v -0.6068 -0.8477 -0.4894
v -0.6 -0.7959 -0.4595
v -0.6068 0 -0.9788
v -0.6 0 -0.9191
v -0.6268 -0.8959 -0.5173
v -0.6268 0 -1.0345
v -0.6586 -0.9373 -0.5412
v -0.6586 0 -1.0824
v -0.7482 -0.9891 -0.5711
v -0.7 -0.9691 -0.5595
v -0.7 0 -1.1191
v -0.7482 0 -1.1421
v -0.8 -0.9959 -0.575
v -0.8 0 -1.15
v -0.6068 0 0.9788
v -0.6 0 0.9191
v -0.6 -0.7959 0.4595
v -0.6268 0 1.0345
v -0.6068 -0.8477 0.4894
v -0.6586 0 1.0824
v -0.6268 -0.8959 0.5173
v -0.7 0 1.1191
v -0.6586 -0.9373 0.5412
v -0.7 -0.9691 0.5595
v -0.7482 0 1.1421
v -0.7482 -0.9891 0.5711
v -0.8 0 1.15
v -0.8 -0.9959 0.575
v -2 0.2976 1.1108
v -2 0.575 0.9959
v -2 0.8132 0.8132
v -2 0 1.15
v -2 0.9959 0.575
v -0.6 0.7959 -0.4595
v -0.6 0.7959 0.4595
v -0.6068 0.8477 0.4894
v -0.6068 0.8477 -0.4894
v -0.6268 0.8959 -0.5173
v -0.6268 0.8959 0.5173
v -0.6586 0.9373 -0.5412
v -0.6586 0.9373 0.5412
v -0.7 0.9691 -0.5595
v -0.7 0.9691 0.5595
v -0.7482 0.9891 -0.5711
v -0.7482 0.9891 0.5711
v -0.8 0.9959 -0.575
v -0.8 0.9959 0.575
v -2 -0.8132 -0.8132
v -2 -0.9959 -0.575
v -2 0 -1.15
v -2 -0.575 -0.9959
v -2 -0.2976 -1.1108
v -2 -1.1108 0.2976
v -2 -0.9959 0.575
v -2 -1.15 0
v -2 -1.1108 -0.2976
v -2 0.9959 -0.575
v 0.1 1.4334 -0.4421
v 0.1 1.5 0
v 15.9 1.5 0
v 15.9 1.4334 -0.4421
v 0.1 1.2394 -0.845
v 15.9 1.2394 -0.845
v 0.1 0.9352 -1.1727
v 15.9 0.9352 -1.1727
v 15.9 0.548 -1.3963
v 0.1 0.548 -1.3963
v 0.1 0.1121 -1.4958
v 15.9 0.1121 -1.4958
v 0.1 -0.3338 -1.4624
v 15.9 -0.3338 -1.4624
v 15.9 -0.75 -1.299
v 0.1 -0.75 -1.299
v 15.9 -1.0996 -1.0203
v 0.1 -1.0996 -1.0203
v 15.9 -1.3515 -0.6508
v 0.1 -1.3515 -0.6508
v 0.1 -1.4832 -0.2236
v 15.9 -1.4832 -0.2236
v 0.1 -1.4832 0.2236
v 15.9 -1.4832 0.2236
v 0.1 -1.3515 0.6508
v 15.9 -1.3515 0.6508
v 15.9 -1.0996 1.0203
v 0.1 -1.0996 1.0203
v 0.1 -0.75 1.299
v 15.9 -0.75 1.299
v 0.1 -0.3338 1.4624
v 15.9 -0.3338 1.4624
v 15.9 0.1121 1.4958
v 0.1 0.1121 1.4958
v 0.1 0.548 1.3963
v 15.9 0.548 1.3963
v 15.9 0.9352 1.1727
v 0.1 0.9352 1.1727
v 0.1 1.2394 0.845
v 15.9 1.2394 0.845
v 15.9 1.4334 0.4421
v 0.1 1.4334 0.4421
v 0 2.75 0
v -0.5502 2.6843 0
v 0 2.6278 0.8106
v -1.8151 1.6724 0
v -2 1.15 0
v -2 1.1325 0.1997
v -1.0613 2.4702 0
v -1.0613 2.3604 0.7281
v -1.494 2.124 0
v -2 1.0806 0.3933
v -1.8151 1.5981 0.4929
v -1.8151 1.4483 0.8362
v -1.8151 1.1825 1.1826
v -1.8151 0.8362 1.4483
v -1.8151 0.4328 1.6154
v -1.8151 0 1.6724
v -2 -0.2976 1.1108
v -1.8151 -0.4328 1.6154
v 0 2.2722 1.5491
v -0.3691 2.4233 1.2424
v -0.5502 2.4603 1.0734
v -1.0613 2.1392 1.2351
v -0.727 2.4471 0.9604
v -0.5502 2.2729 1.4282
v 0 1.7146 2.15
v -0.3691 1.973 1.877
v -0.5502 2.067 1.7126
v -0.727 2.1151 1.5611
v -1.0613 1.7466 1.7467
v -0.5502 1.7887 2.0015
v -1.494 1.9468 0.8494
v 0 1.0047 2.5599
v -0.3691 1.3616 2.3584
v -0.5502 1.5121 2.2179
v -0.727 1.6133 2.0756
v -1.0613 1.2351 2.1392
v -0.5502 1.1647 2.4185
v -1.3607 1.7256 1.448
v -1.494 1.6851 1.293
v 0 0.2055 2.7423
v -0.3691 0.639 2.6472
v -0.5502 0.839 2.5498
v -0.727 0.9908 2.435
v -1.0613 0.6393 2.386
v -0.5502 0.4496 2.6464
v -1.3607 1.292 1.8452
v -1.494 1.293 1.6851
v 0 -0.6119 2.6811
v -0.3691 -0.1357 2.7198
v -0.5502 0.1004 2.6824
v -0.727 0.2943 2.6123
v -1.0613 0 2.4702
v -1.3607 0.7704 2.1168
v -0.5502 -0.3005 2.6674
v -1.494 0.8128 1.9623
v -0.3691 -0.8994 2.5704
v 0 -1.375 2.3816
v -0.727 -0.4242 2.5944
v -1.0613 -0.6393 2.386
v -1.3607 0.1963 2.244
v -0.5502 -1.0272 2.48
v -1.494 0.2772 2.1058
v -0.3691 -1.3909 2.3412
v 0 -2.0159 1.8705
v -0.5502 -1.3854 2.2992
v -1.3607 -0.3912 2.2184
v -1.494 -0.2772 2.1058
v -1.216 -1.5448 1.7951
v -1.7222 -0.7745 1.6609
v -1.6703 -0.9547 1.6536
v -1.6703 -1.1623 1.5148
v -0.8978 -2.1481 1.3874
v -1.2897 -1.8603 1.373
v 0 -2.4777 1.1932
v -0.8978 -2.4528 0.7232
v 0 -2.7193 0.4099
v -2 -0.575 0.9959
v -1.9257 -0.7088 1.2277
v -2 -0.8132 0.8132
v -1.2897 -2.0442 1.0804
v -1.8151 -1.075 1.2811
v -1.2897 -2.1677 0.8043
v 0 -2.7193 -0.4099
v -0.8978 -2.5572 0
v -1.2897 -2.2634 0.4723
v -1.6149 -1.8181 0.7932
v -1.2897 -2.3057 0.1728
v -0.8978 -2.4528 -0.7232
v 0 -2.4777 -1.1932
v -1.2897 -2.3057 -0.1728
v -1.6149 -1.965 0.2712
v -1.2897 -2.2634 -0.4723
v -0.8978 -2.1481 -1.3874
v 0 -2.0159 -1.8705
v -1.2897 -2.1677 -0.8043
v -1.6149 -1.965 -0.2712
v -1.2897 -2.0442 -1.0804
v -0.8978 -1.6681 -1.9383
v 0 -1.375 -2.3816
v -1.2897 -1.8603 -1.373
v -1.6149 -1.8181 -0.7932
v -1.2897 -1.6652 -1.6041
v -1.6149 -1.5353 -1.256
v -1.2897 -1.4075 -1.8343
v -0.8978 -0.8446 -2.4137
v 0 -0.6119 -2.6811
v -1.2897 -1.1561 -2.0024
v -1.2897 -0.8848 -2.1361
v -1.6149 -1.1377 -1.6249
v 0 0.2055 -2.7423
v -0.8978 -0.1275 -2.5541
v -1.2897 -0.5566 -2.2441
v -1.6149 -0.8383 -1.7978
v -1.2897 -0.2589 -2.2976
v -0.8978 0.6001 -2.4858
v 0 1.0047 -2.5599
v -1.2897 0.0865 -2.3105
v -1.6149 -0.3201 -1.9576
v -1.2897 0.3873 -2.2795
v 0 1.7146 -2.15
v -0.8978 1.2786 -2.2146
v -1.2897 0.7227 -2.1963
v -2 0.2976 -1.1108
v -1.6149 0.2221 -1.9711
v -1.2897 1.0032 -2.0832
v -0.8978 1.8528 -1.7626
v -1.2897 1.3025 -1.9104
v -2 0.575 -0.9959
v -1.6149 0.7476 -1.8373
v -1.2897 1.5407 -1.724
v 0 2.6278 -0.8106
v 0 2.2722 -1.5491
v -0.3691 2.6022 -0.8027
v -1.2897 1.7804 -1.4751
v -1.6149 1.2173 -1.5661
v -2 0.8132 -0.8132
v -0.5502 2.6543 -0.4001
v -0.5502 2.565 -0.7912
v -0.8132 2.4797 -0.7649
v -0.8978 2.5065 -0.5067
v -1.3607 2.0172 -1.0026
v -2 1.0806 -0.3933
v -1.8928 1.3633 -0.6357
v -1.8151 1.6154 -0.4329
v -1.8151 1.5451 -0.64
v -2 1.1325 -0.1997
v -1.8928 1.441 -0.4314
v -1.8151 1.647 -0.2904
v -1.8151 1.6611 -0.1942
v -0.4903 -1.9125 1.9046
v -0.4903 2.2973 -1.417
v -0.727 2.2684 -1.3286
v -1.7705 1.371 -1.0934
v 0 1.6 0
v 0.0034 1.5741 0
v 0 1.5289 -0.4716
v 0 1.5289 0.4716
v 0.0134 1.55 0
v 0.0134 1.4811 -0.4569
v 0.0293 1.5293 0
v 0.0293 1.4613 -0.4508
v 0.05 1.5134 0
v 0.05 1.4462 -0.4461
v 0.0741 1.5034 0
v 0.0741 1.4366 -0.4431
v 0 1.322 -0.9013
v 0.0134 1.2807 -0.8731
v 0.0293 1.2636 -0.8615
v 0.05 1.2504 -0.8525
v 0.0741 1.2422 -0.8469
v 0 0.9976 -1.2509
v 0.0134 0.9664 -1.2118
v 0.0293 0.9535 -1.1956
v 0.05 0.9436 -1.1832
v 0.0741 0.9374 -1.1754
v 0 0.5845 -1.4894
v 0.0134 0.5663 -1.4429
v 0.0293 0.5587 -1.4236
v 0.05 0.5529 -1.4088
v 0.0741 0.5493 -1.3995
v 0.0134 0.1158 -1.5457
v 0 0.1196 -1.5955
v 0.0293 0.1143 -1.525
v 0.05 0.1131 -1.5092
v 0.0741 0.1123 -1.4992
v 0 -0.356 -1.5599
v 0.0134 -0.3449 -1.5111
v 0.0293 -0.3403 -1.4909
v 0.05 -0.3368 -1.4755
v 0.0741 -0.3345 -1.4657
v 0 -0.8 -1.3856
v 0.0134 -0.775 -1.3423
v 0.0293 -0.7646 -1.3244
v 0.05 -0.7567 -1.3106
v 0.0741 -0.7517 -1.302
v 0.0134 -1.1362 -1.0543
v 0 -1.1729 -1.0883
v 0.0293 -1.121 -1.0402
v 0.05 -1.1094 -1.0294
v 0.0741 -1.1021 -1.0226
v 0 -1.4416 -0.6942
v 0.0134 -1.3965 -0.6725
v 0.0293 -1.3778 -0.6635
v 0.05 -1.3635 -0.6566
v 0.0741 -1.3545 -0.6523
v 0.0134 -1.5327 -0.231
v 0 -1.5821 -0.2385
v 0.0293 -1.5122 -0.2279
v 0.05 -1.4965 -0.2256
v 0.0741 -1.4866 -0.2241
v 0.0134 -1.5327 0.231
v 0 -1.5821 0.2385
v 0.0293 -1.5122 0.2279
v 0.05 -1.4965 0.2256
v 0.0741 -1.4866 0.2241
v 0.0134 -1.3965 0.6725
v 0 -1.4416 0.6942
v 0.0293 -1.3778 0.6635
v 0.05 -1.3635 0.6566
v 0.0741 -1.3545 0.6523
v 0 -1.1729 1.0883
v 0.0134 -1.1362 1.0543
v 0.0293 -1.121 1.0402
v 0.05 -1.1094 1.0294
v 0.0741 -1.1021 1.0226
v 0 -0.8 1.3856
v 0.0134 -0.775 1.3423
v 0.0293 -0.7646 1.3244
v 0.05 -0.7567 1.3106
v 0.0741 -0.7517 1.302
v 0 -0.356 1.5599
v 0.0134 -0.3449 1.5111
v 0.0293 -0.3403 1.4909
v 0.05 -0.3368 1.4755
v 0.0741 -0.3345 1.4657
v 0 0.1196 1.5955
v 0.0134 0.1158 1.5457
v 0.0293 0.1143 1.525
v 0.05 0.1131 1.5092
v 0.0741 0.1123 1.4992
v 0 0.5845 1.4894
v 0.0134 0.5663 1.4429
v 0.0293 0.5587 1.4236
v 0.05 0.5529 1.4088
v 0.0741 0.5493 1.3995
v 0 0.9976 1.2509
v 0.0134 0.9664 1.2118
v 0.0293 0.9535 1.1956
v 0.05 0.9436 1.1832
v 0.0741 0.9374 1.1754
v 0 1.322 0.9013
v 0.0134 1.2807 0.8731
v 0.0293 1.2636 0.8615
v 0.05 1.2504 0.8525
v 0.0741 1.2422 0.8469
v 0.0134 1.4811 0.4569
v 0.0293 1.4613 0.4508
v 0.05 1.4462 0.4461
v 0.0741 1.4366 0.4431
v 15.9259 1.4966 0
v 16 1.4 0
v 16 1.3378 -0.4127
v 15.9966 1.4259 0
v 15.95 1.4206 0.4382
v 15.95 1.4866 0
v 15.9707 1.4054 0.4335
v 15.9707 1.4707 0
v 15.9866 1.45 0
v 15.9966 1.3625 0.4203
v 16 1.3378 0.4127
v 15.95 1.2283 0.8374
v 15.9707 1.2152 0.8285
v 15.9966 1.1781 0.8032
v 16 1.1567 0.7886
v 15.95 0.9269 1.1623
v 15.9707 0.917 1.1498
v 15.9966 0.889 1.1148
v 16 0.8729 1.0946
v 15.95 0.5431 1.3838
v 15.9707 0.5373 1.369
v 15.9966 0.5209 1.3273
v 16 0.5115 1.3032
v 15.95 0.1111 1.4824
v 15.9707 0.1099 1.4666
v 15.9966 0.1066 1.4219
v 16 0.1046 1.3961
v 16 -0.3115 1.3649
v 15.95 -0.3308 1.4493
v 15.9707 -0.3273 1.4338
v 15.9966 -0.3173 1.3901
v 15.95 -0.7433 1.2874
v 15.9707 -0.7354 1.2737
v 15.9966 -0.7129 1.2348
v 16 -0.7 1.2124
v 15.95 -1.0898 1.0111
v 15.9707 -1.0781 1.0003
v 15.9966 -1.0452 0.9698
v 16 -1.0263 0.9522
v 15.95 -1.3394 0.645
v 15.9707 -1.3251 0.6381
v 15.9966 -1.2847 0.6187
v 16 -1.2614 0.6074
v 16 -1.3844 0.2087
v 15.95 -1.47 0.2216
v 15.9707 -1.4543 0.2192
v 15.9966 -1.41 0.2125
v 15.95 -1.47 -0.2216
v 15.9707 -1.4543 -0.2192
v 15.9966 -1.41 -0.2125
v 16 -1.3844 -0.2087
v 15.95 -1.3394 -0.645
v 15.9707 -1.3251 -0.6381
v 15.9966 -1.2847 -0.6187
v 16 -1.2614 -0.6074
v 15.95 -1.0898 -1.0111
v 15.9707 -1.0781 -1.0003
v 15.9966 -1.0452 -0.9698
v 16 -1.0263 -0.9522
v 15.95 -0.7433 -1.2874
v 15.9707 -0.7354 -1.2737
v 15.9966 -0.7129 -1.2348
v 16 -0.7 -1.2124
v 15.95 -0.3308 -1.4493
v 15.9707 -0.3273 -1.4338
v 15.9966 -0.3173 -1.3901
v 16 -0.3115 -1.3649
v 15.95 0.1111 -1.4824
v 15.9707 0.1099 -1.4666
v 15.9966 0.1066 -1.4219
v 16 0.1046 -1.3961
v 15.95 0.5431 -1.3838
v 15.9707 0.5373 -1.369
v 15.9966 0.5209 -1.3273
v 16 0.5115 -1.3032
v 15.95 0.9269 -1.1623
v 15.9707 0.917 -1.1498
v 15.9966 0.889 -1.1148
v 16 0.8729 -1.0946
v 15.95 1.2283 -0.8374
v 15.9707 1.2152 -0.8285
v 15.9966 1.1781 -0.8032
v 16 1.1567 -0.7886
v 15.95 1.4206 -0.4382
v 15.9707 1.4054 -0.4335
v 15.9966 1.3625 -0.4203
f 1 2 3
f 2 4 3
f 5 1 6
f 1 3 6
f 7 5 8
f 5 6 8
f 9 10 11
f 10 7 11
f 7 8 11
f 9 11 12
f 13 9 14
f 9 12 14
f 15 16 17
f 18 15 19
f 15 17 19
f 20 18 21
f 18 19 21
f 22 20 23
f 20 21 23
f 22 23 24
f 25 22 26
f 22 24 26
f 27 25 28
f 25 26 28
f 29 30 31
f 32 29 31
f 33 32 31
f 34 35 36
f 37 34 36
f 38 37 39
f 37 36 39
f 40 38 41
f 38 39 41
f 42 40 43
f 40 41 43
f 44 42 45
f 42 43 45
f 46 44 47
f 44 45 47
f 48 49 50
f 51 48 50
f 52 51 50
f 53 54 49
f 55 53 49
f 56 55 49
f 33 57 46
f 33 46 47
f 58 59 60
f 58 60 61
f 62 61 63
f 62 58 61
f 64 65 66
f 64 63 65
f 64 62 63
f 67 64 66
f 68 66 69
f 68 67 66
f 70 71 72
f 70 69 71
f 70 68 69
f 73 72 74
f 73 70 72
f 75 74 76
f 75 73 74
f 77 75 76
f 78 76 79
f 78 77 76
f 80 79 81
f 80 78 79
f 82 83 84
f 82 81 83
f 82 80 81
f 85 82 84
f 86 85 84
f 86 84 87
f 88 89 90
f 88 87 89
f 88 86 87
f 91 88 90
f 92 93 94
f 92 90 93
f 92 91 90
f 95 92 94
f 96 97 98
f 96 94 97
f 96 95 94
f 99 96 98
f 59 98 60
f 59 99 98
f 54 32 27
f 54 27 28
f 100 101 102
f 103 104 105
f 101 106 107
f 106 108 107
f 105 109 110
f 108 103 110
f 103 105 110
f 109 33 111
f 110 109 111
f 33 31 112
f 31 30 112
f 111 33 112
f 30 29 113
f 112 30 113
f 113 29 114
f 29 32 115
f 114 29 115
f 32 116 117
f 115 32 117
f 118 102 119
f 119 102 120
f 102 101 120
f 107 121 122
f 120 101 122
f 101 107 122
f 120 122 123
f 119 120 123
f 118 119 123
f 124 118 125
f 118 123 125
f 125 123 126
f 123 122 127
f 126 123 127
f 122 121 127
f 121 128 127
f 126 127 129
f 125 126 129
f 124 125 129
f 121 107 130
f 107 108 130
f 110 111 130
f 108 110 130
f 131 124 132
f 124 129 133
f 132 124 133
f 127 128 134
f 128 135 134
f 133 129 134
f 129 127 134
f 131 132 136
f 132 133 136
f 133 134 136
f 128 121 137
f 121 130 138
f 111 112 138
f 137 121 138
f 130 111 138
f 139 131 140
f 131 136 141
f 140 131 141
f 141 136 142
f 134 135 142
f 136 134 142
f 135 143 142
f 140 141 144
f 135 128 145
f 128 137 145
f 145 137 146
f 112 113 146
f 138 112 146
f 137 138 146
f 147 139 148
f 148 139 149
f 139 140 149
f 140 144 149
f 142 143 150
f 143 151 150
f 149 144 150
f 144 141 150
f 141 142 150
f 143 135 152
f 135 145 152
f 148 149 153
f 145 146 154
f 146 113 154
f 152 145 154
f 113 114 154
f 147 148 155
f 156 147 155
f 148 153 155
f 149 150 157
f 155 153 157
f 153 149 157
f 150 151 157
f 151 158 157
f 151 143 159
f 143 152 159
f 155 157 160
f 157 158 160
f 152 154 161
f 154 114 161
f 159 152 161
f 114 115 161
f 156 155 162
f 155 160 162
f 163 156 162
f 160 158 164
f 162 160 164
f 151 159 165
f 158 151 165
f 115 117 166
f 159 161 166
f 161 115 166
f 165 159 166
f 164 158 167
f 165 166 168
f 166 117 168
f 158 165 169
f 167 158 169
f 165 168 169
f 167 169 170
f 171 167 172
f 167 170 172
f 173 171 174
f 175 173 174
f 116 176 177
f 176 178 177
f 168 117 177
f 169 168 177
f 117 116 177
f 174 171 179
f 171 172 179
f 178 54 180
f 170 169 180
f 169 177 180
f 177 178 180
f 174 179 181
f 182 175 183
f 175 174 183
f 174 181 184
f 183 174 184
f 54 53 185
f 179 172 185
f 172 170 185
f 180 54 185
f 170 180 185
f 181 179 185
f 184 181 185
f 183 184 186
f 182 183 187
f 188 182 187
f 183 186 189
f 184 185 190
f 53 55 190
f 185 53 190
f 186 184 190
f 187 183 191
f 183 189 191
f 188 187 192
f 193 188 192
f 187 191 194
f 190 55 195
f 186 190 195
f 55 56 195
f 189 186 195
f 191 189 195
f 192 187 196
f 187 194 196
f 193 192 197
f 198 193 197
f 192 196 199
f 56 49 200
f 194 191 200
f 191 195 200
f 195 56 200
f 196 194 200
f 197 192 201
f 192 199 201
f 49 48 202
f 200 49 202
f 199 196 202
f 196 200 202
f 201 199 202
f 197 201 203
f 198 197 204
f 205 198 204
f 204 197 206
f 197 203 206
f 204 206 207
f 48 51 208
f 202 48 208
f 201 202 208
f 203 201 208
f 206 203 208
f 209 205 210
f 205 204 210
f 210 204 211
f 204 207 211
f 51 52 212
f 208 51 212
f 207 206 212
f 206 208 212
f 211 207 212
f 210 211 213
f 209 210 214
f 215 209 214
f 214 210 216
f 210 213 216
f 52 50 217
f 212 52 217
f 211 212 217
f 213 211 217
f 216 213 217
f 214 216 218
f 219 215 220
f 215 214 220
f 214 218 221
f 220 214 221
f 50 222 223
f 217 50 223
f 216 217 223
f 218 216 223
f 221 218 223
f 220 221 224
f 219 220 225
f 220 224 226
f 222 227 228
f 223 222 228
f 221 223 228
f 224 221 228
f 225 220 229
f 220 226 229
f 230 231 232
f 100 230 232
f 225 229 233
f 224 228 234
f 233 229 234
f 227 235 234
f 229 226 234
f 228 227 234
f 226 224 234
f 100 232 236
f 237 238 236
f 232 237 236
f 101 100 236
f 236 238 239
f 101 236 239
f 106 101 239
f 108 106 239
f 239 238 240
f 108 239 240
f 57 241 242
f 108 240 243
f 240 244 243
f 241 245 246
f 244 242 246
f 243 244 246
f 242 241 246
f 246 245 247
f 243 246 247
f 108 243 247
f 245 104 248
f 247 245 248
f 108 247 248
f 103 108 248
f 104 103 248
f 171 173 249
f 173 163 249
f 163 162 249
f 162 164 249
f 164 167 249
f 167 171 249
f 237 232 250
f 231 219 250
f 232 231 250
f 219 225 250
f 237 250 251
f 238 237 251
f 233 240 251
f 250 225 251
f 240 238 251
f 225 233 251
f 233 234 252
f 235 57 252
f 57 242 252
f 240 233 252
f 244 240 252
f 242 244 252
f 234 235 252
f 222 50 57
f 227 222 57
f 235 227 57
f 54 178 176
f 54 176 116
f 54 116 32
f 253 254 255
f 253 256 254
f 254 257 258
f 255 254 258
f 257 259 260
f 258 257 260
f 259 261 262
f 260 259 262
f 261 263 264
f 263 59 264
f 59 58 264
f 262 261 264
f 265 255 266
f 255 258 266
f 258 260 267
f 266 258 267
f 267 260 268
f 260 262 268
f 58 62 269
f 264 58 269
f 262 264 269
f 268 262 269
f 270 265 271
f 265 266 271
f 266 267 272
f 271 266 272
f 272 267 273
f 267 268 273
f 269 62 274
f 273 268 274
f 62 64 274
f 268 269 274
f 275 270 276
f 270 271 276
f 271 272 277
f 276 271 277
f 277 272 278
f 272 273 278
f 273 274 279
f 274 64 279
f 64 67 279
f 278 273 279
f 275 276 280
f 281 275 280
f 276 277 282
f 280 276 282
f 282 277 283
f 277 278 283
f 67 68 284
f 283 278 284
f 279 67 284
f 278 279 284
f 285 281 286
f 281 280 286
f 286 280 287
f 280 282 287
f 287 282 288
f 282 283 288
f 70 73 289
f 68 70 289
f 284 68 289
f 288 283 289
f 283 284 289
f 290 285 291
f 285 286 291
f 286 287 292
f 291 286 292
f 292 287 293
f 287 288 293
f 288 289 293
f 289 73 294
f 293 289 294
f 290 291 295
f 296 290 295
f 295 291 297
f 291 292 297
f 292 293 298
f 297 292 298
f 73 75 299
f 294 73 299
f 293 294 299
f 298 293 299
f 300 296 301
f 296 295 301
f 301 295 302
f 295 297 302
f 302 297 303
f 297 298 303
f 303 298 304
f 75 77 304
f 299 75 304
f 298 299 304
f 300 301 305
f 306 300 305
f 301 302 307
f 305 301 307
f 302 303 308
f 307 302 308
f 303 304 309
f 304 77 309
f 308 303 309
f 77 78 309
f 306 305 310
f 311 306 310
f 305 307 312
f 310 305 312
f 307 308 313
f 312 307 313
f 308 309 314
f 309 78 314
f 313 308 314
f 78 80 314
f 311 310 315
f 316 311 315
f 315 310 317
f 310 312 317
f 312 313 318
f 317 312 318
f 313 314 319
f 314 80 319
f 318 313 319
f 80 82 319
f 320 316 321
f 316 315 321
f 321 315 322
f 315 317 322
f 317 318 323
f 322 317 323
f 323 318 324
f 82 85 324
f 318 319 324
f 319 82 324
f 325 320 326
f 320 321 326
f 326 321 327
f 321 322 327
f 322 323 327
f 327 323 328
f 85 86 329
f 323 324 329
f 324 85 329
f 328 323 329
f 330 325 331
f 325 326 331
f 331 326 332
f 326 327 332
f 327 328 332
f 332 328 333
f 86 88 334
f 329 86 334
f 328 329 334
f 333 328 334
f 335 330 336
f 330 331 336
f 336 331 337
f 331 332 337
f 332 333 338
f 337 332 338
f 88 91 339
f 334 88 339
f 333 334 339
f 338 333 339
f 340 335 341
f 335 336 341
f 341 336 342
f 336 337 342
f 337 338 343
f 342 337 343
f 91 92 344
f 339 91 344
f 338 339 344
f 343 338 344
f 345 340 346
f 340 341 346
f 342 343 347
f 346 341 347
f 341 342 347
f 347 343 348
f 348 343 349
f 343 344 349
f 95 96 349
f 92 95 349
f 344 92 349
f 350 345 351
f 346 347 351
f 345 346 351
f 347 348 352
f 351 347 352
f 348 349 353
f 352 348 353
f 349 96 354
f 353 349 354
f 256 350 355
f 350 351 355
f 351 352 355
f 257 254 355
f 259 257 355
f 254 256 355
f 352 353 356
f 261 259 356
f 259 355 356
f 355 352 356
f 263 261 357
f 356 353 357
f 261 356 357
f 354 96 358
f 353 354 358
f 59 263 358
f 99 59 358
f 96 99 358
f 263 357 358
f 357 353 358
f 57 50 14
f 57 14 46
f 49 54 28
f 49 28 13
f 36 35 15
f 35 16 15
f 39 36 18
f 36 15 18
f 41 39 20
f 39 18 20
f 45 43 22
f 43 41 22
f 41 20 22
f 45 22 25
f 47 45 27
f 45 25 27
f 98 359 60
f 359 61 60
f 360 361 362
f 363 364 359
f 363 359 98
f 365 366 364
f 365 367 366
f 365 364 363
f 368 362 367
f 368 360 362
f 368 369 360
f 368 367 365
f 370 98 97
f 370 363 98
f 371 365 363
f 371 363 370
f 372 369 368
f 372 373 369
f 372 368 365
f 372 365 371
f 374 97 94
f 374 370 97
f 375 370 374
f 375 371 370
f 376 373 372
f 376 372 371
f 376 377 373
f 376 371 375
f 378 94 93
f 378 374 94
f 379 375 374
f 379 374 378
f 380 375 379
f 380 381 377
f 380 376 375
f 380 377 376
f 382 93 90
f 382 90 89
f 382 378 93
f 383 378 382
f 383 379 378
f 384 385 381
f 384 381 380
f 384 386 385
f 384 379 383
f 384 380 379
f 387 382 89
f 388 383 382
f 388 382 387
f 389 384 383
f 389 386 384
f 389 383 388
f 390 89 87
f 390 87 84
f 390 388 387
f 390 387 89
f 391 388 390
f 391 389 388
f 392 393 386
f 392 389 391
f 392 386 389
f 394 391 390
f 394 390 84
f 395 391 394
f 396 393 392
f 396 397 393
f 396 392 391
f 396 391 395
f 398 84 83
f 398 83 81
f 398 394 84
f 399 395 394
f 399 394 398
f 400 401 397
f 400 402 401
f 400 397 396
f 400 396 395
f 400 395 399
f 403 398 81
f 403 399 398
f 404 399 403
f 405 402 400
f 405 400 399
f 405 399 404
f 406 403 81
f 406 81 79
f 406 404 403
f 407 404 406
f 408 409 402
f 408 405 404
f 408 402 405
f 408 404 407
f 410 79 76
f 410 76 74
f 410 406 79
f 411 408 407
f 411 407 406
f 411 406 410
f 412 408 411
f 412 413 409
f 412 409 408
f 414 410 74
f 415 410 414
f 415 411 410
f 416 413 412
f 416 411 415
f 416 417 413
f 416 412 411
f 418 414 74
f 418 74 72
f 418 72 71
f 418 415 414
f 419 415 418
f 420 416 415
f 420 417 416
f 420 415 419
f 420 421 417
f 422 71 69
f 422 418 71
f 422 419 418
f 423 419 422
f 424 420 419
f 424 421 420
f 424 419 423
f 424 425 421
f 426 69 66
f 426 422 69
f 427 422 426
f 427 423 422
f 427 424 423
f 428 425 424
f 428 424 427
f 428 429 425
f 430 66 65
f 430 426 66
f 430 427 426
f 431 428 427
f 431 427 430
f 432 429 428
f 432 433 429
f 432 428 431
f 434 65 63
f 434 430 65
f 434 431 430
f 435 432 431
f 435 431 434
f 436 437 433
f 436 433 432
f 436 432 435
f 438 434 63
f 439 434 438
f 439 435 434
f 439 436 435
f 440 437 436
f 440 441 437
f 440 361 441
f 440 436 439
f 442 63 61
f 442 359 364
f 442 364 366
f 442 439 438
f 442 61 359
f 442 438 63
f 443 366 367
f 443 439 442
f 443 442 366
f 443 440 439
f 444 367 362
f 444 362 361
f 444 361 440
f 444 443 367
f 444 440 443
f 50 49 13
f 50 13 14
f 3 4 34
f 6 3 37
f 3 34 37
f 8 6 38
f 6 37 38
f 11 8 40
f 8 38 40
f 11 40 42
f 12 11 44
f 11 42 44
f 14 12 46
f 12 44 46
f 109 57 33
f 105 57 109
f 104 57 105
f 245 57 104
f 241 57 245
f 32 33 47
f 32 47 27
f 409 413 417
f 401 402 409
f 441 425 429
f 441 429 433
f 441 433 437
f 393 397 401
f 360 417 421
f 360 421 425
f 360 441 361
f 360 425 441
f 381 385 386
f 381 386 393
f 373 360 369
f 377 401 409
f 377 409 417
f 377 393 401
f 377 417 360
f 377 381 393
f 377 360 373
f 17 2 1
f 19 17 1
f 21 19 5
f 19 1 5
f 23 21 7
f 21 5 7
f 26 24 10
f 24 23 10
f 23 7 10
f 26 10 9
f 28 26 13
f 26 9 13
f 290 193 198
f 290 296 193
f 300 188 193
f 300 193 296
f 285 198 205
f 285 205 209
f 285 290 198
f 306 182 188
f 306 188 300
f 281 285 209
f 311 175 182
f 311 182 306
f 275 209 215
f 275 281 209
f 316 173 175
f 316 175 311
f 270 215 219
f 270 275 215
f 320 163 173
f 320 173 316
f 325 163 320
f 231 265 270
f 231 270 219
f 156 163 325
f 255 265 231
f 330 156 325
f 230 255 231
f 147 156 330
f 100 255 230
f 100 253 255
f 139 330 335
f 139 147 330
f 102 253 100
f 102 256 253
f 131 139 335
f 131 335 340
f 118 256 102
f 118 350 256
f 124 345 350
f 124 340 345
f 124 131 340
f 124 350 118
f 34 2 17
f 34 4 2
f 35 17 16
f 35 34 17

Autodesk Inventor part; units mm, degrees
ref_plane "YZ Plane" through (0, 0, 0) normal (1, 0, 0) x (0, 1, 0)
ref_plane "XZ Plane" through (0, 0, 0) normal (0, 1, 0) x (-1, 0, 0)
ref_plane "XY Plane" through (0, 0, 0) normal (0, 0, 1) x (1, 0, 0)
sketch "スケッチ1" plane through (0, 0, 0) normal (0, 0, 1) x (1, 0, 0)
  line L0 (0, 0) -> (16, 0)
  line L1 (16, 0) -> (16, 1.5)
  line L2 (16, 1.5) -> (0, 1.5)
  line L3 (0, 1.5) -> (0, 0)
  line L4 (0, 0) -> (0, 2.75)
  line L5 (0, 0) -> (-2, 0)
  line L6 (-2, 0) -> (0, 0)
  line L7 (-2, 0) -> (-2, 1.15)
  arc A0 (0, 2.75) -> (-2, 1.15) centre (-0.0403, 0.7504) ccw
  dimension "d0" = 1.5
  dimension "d1" = 16
  dimension "d3" = 2
  dimension "d4" = 2.75
  dimension "d5" = 1.15
  dimension "d6" = 2
revolve "回転1" add sketch "スケッチ1" angle 360 about axis through (-2, 0, 0) along (1, 0, 0)
thread "ねじ1" size "M3x0.5" class "6g" standard "ANSI Metric M Profile" length 100
sketch "スケッチ2" plane through (-2, 0, 0) normal (-1, 0, 0) x (0, 0, 1)
  circle A0 centre (0, 0) radius 1.15 projected
  line L0 (-0.575, 0.9959) -> (0.575, 0.9959)
  line L1 (0.575, 0.9959) -> (1.15, 0)
  line L2 (1.15, 0) -> (0.575, -0.9959)
  line L3 (0.575, -0.9959) -> (-0.575, -0.9959)
  line L4 (-0.575, -0.9959) -> (-1.15, 0)
  line L5 (-1.15, 0) -> (-0.575, 0.9959)
  dimension "d10" = 1.15
  dimension "d11" = 1.9919
extrude "押し出し1" cut sketch "スケッチ2" against normal blind 1.4 contours L2 L3 L4 L5 L0 L1
fillet "フィレット1" radius 0.2 6 edges at (-0.6, 0.9959, 0) (-0.6, 0.498, 0.8625) (-0.6, 0.498, -0.8625) (-0.6, -0.498, -0.8625) (-0.6, -0.9959, 0) (-0.6, -0.498, 0.8625)
fillet "フィレット2" radius 0.1 1 edges at (0, -1.5, 0)
fillet "フィレット3" radius 0.1 1 edges at (16, -1.5, 0)
properties part number "ネジボタンM3L16" material "鋼"
